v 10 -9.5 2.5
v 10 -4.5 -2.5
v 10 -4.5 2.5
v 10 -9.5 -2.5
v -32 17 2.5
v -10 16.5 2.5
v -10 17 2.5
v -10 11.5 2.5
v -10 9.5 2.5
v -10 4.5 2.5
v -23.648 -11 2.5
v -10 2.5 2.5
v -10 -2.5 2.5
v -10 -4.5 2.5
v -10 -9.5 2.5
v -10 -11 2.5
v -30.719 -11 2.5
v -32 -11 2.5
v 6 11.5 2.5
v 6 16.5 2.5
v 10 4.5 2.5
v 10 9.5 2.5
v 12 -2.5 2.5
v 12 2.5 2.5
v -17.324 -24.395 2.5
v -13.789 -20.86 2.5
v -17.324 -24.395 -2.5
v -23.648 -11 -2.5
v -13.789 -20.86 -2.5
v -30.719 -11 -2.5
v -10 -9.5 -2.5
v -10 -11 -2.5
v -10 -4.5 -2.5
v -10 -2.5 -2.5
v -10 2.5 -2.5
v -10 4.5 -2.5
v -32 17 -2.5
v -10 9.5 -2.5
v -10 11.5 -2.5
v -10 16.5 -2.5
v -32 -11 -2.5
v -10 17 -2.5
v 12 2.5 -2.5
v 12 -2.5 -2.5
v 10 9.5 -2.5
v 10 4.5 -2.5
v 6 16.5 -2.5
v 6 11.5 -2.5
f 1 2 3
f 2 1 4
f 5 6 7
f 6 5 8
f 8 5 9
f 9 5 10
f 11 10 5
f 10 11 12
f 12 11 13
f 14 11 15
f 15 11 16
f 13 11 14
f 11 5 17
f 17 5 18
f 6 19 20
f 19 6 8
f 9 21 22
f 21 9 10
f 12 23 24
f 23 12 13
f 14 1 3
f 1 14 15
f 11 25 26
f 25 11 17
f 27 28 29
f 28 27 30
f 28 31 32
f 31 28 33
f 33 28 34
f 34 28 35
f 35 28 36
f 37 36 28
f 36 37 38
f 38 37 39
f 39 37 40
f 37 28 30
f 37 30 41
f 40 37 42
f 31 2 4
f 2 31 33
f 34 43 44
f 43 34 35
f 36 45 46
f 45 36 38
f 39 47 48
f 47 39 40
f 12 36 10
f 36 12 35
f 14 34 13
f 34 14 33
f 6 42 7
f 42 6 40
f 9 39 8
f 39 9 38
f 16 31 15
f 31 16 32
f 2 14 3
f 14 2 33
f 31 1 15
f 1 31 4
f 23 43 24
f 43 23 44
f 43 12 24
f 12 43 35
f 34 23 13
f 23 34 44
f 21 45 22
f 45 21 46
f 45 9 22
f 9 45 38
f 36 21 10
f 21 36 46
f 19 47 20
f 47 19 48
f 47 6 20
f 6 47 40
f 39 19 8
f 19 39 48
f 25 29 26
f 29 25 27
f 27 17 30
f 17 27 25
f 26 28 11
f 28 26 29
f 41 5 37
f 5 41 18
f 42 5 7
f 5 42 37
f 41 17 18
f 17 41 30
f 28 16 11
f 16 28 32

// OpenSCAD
translate([0,-7,0]) cube([20,5,5], center=true);
translate([1,0,0]) cube([22,5,5], center=true);
translate([0,7,0]) cube([20,5,5], center=true);
translate([-2,14,0]) cube([16,5,5], center=true);

rotate([0,0,135]) translate([5,27,0]) cube([20,5,5], center=true);

translate([-21,3,0]) cube([22,28,5], center=true);
